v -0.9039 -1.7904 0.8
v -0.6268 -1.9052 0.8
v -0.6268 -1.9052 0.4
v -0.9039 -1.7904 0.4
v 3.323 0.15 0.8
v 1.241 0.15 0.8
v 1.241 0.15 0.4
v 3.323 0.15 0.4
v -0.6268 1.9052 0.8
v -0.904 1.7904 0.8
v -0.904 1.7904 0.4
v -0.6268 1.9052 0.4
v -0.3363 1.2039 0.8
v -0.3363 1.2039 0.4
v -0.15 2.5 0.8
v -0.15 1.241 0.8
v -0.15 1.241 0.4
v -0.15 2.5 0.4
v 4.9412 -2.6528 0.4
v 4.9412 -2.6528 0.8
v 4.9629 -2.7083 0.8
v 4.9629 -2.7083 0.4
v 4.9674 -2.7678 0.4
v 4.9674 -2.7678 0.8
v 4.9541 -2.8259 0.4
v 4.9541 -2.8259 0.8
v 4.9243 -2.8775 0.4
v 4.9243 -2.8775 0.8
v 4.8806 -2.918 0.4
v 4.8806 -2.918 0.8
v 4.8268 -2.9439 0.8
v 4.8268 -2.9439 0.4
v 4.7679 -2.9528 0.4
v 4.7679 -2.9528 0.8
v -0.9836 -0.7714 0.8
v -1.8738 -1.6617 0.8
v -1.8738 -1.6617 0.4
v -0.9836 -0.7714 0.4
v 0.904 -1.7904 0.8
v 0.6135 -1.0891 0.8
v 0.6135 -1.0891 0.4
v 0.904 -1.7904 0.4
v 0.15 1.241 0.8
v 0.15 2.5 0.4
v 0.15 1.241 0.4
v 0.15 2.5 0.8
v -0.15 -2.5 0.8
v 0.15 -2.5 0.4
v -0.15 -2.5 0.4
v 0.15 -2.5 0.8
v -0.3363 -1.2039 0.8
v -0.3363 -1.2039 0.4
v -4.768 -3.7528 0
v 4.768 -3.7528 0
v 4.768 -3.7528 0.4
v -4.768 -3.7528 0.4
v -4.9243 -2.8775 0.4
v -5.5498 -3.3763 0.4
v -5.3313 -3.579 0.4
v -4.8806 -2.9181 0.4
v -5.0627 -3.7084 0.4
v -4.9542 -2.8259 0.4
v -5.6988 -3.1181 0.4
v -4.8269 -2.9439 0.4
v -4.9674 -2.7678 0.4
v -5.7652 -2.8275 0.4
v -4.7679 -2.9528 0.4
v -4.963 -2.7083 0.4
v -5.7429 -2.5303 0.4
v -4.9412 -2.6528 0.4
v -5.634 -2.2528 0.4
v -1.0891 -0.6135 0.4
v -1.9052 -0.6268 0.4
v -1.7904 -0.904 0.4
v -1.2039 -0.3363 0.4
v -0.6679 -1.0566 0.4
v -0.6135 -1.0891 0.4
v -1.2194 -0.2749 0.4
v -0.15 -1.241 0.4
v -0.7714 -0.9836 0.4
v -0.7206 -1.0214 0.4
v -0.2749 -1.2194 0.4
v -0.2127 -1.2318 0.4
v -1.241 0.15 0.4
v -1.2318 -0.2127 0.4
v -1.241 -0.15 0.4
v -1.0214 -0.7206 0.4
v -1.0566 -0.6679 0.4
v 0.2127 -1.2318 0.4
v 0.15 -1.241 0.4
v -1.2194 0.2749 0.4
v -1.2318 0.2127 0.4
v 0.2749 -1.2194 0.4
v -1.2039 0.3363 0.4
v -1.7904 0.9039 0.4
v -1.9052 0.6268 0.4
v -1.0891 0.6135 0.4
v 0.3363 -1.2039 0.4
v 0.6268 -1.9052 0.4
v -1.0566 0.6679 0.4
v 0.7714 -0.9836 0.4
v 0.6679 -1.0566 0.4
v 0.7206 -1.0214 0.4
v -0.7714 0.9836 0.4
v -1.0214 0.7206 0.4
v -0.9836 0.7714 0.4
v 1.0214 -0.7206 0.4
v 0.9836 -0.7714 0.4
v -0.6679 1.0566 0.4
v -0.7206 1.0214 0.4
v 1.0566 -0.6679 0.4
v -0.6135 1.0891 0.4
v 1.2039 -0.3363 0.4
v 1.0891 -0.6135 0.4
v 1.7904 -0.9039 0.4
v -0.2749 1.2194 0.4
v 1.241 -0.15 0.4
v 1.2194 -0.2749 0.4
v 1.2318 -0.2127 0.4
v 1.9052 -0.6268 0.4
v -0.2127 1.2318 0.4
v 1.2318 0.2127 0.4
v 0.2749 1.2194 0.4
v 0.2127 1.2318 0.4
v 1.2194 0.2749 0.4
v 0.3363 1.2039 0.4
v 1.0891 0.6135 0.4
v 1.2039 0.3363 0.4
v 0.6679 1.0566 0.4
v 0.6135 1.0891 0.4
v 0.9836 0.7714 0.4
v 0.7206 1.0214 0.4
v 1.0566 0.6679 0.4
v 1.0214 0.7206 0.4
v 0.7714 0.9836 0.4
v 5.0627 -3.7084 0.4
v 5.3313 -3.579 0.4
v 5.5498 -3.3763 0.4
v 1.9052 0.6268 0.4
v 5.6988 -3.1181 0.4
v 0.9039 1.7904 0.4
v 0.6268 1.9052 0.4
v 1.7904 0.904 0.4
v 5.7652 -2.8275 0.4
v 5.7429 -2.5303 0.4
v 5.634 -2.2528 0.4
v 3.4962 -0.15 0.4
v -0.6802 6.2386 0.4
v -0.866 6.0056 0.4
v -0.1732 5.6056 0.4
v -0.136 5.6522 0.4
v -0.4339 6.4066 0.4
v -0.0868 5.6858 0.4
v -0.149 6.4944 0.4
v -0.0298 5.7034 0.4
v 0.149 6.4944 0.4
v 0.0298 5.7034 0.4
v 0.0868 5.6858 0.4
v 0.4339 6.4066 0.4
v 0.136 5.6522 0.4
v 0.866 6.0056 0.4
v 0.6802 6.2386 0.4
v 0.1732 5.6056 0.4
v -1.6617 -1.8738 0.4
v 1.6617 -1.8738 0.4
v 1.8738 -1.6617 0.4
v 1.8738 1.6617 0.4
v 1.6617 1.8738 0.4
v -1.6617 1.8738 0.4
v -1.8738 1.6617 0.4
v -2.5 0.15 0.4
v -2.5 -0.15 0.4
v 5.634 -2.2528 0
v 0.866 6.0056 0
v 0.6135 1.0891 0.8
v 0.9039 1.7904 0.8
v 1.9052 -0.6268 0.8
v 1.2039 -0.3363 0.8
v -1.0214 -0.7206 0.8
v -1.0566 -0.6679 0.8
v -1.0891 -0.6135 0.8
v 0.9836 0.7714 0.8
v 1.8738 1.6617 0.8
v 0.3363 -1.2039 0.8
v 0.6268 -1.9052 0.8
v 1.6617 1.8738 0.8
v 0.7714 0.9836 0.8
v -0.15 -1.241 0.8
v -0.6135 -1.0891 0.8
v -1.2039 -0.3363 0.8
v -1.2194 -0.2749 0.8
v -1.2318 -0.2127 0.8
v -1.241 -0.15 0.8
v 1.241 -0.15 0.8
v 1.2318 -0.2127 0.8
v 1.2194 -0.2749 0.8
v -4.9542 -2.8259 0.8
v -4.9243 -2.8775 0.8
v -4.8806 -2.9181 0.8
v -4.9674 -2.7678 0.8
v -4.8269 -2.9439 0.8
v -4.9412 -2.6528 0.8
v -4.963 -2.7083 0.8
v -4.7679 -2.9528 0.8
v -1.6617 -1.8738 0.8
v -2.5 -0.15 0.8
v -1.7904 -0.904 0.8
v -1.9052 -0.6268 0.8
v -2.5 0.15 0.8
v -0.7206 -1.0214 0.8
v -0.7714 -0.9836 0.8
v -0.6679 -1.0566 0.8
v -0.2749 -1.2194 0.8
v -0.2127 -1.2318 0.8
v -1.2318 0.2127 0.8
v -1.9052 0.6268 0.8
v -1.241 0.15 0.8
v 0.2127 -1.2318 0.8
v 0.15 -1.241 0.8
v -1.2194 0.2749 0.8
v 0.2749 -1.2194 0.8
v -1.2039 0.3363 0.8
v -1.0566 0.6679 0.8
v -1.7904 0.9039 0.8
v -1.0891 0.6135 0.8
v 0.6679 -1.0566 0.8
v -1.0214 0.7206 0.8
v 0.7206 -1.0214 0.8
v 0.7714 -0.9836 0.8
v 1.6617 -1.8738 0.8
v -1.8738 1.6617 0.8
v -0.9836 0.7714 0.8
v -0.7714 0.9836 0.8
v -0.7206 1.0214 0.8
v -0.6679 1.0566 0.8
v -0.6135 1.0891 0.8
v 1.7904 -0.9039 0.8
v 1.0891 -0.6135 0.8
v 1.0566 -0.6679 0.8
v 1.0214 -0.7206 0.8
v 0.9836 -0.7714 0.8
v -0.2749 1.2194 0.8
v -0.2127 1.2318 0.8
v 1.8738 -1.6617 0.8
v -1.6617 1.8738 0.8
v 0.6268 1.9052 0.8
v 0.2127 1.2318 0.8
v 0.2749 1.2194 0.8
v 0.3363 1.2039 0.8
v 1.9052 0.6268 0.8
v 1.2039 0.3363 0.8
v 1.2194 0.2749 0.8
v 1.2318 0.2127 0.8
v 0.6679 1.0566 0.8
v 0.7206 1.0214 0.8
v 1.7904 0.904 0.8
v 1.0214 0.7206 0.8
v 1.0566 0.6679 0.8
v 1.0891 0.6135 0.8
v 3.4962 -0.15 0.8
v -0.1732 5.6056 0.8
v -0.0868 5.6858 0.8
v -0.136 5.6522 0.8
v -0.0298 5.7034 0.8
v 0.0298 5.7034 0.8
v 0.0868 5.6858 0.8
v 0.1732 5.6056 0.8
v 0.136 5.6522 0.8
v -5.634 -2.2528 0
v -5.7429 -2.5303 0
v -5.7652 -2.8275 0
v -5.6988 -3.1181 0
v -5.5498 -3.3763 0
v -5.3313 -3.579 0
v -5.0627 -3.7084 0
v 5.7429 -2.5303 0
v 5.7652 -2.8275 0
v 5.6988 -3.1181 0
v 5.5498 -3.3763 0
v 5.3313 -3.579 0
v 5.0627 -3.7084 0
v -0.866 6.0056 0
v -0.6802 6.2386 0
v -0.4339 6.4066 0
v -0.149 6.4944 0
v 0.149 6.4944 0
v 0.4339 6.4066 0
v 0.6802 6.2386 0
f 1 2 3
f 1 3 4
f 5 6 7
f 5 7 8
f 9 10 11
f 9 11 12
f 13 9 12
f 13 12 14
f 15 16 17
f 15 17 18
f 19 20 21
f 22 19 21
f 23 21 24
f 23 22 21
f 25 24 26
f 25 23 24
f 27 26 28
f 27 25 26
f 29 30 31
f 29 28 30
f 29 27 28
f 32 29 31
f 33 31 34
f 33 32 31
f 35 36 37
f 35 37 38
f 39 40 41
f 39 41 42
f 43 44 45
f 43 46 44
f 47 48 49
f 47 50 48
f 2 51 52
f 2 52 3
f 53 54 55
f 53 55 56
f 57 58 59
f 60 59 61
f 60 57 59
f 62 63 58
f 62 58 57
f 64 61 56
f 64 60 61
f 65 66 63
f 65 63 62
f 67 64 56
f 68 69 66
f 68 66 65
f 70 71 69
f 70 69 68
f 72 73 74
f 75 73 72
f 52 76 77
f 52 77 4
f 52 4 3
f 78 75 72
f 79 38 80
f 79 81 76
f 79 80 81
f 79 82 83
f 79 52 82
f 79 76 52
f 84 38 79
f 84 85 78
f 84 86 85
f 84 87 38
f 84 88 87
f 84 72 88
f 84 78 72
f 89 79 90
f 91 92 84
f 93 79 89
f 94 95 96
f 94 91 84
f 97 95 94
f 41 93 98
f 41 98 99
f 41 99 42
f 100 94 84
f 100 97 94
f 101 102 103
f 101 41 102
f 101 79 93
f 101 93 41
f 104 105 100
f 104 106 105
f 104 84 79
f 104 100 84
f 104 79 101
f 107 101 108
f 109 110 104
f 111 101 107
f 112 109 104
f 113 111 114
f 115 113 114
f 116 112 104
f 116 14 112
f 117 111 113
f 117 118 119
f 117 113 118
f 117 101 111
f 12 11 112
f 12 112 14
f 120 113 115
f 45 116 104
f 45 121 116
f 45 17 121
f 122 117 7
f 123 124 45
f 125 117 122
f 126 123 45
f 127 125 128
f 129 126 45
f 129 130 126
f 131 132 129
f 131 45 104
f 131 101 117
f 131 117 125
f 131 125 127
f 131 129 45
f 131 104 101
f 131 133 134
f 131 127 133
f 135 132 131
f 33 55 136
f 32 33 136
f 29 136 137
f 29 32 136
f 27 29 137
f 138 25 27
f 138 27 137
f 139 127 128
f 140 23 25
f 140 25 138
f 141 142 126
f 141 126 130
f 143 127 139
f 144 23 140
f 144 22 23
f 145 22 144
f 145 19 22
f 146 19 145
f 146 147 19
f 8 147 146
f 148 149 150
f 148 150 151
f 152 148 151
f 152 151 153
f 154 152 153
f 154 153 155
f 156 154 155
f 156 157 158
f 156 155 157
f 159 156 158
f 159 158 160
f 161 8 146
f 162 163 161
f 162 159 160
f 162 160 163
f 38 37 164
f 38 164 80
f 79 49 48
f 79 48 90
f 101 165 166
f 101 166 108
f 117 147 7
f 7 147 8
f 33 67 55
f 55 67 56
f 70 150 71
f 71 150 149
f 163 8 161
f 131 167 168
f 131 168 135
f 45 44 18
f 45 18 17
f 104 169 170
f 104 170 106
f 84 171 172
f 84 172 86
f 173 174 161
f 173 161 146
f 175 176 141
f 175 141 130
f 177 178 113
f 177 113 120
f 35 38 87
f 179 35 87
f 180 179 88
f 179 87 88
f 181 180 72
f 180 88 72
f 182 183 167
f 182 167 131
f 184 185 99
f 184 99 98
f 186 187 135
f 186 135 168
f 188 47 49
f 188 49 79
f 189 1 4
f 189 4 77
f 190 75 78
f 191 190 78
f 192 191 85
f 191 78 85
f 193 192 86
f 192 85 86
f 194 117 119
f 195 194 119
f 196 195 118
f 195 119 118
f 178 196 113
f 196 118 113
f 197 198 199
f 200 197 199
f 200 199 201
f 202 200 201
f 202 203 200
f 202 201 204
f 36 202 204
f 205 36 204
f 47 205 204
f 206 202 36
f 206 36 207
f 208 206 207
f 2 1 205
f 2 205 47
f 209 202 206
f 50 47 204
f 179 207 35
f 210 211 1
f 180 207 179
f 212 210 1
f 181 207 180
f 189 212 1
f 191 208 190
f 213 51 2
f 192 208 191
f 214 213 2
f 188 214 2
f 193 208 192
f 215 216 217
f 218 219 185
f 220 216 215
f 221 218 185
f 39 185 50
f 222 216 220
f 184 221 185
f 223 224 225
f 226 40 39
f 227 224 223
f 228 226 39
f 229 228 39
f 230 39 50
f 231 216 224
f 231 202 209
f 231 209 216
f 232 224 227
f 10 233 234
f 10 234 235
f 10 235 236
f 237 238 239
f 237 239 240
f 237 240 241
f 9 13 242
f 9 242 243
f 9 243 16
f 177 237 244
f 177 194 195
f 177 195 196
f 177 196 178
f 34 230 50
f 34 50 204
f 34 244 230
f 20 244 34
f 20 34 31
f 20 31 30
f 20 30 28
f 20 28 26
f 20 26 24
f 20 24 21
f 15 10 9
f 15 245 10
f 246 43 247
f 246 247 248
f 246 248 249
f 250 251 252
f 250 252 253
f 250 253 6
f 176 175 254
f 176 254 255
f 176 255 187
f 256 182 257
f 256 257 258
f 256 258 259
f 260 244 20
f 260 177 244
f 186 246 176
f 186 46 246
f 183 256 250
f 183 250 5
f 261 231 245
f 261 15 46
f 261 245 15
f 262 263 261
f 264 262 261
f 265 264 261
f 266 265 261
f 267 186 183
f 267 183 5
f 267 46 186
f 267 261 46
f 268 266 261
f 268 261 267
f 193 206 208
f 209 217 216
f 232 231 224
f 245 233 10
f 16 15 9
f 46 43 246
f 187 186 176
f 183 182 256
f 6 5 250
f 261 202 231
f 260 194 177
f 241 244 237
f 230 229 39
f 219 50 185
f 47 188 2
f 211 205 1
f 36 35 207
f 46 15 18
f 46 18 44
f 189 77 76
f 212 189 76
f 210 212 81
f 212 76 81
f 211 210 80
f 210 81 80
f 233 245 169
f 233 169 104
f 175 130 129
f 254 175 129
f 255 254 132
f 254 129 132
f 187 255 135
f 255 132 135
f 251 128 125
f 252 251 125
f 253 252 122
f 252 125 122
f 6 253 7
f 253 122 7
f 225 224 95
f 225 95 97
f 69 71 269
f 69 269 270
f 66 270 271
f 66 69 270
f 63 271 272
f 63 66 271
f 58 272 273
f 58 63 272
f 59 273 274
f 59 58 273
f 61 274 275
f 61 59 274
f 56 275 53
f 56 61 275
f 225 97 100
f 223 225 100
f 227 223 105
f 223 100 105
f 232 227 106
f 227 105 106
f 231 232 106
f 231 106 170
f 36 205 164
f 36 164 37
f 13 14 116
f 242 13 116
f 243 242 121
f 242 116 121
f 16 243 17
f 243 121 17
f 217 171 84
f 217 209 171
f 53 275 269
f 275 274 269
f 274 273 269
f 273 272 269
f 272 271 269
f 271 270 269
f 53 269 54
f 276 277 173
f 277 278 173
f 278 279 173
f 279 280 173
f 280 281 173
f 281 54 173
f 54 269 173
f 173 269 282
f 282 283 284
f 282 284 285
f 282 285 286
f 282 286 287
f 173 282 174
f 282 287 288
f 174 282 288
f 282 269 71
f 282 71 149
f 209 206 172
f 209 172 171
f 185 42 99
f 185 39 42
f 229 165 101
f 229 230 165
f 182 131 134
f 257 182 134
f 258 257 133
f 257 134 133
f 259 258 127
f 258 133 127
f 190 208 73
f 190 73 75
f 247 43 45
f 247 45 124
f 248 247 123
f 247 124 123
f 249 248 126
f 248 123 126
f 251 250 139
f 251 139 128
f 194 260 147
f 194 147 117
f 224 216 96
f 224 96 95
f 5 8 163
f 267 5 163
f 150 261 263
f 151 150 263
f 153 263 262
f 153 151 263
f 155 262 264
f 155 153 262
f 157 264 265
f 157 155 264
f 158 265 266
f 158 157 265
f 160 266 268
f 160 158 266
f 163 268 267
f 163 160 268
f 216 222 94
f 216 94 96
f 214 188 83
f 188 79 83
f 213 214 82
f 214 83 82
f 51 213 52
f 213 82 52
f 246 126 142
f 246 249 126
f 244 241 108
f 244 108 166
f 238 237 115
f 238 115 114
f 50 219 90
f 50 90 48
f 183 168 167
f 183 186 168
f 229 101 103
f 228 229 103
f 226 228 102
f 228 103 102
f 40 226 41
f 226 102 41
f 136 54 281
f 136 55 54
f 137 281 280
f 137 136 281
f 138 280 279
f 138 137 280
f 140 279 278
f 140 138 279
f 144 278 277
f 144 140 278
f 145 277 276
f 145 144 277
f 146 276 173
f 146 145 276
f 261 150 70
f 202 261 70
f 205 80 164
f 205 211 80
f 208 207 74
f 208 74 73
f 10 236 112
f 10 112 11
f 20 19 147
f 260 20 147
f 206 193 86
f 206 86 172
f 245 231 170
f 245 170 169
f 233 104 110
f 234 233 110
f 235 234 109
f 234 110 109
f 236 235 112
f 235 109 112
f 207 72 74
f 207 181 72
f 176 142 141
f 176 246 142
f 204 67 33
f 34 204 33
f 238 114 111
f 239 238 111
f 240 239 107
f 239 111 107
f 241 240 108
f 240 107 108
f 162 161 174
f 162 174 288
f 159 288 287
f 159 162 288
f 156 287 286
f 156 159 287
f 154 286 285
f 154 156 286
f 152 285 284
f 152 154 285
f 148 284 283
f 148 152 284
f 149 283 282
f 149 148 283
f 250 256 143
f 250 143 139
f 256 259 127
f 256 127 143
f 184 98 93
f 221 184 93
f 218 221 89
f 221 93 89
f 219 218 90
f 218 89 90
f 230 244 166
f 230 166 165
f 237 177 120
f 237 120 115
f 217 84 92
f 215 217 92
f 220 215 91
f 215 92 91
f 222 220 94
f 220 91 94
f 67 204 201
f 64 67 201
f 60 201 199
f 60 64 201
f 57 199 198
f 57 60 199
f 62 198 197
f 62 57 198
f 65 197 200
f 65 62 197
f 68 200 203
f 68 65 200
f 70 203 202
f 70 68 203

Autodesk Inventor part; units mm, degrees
ref_plane "YZ Plane" through (0, 0, 0) normal (1, 0, 0) x (0, 1, 0)
ref_plane "XZ Plane" through (0, 0, 0) normal (0, 1, 0) x (-1, 0, 0)
ref_plane "XY Plane" through (0, 0, 0) normal (0, 0, 1) x (1, 0, 0)
sketch "Sketch1" plane through (0, 0, 0) normal (0, 0, 1) x (1, 0, 0)
  line L0 (-9.1, 0) -> (9.1, 0) construction
  line L1 (0, -6.0044) -> (0, 9.7572) construction
  line L2 (0, 7.5056) -> (6.5, -3.7528)
  line L3 (6.5, -3.7528) -> (-6.5, -3.7528)
  line L4 (-6.5, -3.7528) -> (0, 7.5056)
  point P0 (0, 0)
  point P1 (0, 0)
  dimension "d0" = 13
extrude "Extrusion1" add sketch "Sketch1" along normal blind 0.4
fillet "Fillet1" radius 1 3 edges at (-6.5, -3.7528, 0.2) (6.5, -3.7528, 0.2) (0, 7.5056, 0.2)
sketch "Sketch2" plane through (0, 0, 0.4) normal (0, 0, 1) x (1, 0, 0)
  arc A0 (-5.634, -2.2528) -> (-4.7679, -3.7528) centre (-4.7679, -2.7528) ccw projected
  line L0 (-5.634, -2.2528) -> (-0.866, 6.0056) projected
  arc A1 (0.866, 6.0056) -> (-0.866, 6.0056) centre (0, 5.5056) ccw projected
  line L1 (0.866, 6.0056) -> (5.634, -2.2528) projected
  arc A2 (4.7679, -3.7528) -> (5.634, -2.2528) centre (4.7679, -2.7528) ccw projected
  line L2 (4.7679, -3.7528) -> (-4.7679, -3.7528) projected
  line L3 (-0.1732, 5.6056) -> (-4.9412, -2.6528)
  arc A3 (-4.9412, -2.6528) -> (-4.7679, -2.9528) centre (-4.7679, -2.7528) ccw
  line L4 (-4.7679, -2.9528) -> (4.7679, -2.9528)
  arc A4 (4.7679, -2.9528) -> (4.9412, -2.6528) centre (4.7679, -2.7528) ccw
  line L5 (4.9412, -2.6528) -> (0.1732, 5.6056)
  arc A5 (0.1732, 5.6056) -> (-0.1732, 5.6056) centre (0, 5.5056) ccw
  circle A6 centre (0, 0) radius 1.25
  dimension "d4" = 0.8
  dimension "d5" = 2.5
extrude "Extrusion2" add sketch "Sketch2" along normal blind 0.4 contours A5 L5 A4 L4 A3 L3
sketch "Sketch3" plane through (0, 0, 0.8) normal (0, 0, 1) x (1, 0, 0)
  line L0 (-8.0751, 0) -> (8.0751, 0) construction
  line L1 (0, -5.8044) -> (0, 8.5572) construction
  circle A0 centre (0, 0) radius 1.25 construction
  line L2 (-0.15, 2.5) -> (0.15, 2.5)
  line L3 (0.15, 2.5) -> (0.15, -0.4687)
  line L4 (0.15, -0.4687) -> (-0.15, -0.4687)
  line L5 (-0.15, -0.4687) -> (-0.15, 2.5)
  point P0 (0, 2.5)
  dimension "d8" = 0.3
  dimension "d9" = 2.5
extrude "Extrusion3" cut sketch "Sketch3" against normal blind 0.4
pattern_circular "Circular Pattern1" count 8 over 360 about axis through (0, 0, -10) along (0, 0, 1) of "Extrusion3"
sketch "Sketch4" plane through (0, 0, 0.8) normal (0, 0, 1) x (1, 0, 0)
  line L0 (0, -5.8044) -> (0, 8.5572) construction
  line L1 (-8.0751, 0) -> (8.0751, 0) construction
  line L2 (0, 0) -> (1.8051, 4.3579) construction
  line L3 (0.6268, 1.9052) -> (0.9039, 1.7904)
  line L4 (0.9039, 1.7904) -> (0.2506, 0.2129)
  line L5 (0.2506, 0.2129) -> (-0.0266, 0.3277)
  line L6 (-0.0266, 0.3277) -> (0.6268, 1.9052)
  point P0 (0.7654, 1.8478)
  dimension "d15" = 22.5
  dimension "d16" = 0.3
  dimension "d17" = 2
extrude "Extrusion4" cut sketch "Sketch4" against normal blind 0.4
pattern_circular "Circular Pattern2" count 8 over 360 about axis through (0, 0, -10) along (0, 0, 1) of "Extrusion4"
sketch "Sketch5" plane through (0, 0, 0.8) normal (0, 0, 1) x (1, 0, 0)
  line L0 (1.241, 0.15) -> (2.5, 0.15) construction
  line L1 (2.5, -0.15) -> (1.241, -0.15) construction
  line L2 (2.5, 0.15) -> (5.6384, 0.15)
  line L3 (5.6384, 0.15) -> (5.6384, -0.15)
  line L4 (5.6384, -0.15) -> (2.5, -0.15)
  line L5 (2.5, -0.15) -> (2.5, 0.15)
  point P0 (0, 0)
extrude "Extrusion5" cut sketch "Sketch5" against normal blind 0.4
properties part number "P129"
